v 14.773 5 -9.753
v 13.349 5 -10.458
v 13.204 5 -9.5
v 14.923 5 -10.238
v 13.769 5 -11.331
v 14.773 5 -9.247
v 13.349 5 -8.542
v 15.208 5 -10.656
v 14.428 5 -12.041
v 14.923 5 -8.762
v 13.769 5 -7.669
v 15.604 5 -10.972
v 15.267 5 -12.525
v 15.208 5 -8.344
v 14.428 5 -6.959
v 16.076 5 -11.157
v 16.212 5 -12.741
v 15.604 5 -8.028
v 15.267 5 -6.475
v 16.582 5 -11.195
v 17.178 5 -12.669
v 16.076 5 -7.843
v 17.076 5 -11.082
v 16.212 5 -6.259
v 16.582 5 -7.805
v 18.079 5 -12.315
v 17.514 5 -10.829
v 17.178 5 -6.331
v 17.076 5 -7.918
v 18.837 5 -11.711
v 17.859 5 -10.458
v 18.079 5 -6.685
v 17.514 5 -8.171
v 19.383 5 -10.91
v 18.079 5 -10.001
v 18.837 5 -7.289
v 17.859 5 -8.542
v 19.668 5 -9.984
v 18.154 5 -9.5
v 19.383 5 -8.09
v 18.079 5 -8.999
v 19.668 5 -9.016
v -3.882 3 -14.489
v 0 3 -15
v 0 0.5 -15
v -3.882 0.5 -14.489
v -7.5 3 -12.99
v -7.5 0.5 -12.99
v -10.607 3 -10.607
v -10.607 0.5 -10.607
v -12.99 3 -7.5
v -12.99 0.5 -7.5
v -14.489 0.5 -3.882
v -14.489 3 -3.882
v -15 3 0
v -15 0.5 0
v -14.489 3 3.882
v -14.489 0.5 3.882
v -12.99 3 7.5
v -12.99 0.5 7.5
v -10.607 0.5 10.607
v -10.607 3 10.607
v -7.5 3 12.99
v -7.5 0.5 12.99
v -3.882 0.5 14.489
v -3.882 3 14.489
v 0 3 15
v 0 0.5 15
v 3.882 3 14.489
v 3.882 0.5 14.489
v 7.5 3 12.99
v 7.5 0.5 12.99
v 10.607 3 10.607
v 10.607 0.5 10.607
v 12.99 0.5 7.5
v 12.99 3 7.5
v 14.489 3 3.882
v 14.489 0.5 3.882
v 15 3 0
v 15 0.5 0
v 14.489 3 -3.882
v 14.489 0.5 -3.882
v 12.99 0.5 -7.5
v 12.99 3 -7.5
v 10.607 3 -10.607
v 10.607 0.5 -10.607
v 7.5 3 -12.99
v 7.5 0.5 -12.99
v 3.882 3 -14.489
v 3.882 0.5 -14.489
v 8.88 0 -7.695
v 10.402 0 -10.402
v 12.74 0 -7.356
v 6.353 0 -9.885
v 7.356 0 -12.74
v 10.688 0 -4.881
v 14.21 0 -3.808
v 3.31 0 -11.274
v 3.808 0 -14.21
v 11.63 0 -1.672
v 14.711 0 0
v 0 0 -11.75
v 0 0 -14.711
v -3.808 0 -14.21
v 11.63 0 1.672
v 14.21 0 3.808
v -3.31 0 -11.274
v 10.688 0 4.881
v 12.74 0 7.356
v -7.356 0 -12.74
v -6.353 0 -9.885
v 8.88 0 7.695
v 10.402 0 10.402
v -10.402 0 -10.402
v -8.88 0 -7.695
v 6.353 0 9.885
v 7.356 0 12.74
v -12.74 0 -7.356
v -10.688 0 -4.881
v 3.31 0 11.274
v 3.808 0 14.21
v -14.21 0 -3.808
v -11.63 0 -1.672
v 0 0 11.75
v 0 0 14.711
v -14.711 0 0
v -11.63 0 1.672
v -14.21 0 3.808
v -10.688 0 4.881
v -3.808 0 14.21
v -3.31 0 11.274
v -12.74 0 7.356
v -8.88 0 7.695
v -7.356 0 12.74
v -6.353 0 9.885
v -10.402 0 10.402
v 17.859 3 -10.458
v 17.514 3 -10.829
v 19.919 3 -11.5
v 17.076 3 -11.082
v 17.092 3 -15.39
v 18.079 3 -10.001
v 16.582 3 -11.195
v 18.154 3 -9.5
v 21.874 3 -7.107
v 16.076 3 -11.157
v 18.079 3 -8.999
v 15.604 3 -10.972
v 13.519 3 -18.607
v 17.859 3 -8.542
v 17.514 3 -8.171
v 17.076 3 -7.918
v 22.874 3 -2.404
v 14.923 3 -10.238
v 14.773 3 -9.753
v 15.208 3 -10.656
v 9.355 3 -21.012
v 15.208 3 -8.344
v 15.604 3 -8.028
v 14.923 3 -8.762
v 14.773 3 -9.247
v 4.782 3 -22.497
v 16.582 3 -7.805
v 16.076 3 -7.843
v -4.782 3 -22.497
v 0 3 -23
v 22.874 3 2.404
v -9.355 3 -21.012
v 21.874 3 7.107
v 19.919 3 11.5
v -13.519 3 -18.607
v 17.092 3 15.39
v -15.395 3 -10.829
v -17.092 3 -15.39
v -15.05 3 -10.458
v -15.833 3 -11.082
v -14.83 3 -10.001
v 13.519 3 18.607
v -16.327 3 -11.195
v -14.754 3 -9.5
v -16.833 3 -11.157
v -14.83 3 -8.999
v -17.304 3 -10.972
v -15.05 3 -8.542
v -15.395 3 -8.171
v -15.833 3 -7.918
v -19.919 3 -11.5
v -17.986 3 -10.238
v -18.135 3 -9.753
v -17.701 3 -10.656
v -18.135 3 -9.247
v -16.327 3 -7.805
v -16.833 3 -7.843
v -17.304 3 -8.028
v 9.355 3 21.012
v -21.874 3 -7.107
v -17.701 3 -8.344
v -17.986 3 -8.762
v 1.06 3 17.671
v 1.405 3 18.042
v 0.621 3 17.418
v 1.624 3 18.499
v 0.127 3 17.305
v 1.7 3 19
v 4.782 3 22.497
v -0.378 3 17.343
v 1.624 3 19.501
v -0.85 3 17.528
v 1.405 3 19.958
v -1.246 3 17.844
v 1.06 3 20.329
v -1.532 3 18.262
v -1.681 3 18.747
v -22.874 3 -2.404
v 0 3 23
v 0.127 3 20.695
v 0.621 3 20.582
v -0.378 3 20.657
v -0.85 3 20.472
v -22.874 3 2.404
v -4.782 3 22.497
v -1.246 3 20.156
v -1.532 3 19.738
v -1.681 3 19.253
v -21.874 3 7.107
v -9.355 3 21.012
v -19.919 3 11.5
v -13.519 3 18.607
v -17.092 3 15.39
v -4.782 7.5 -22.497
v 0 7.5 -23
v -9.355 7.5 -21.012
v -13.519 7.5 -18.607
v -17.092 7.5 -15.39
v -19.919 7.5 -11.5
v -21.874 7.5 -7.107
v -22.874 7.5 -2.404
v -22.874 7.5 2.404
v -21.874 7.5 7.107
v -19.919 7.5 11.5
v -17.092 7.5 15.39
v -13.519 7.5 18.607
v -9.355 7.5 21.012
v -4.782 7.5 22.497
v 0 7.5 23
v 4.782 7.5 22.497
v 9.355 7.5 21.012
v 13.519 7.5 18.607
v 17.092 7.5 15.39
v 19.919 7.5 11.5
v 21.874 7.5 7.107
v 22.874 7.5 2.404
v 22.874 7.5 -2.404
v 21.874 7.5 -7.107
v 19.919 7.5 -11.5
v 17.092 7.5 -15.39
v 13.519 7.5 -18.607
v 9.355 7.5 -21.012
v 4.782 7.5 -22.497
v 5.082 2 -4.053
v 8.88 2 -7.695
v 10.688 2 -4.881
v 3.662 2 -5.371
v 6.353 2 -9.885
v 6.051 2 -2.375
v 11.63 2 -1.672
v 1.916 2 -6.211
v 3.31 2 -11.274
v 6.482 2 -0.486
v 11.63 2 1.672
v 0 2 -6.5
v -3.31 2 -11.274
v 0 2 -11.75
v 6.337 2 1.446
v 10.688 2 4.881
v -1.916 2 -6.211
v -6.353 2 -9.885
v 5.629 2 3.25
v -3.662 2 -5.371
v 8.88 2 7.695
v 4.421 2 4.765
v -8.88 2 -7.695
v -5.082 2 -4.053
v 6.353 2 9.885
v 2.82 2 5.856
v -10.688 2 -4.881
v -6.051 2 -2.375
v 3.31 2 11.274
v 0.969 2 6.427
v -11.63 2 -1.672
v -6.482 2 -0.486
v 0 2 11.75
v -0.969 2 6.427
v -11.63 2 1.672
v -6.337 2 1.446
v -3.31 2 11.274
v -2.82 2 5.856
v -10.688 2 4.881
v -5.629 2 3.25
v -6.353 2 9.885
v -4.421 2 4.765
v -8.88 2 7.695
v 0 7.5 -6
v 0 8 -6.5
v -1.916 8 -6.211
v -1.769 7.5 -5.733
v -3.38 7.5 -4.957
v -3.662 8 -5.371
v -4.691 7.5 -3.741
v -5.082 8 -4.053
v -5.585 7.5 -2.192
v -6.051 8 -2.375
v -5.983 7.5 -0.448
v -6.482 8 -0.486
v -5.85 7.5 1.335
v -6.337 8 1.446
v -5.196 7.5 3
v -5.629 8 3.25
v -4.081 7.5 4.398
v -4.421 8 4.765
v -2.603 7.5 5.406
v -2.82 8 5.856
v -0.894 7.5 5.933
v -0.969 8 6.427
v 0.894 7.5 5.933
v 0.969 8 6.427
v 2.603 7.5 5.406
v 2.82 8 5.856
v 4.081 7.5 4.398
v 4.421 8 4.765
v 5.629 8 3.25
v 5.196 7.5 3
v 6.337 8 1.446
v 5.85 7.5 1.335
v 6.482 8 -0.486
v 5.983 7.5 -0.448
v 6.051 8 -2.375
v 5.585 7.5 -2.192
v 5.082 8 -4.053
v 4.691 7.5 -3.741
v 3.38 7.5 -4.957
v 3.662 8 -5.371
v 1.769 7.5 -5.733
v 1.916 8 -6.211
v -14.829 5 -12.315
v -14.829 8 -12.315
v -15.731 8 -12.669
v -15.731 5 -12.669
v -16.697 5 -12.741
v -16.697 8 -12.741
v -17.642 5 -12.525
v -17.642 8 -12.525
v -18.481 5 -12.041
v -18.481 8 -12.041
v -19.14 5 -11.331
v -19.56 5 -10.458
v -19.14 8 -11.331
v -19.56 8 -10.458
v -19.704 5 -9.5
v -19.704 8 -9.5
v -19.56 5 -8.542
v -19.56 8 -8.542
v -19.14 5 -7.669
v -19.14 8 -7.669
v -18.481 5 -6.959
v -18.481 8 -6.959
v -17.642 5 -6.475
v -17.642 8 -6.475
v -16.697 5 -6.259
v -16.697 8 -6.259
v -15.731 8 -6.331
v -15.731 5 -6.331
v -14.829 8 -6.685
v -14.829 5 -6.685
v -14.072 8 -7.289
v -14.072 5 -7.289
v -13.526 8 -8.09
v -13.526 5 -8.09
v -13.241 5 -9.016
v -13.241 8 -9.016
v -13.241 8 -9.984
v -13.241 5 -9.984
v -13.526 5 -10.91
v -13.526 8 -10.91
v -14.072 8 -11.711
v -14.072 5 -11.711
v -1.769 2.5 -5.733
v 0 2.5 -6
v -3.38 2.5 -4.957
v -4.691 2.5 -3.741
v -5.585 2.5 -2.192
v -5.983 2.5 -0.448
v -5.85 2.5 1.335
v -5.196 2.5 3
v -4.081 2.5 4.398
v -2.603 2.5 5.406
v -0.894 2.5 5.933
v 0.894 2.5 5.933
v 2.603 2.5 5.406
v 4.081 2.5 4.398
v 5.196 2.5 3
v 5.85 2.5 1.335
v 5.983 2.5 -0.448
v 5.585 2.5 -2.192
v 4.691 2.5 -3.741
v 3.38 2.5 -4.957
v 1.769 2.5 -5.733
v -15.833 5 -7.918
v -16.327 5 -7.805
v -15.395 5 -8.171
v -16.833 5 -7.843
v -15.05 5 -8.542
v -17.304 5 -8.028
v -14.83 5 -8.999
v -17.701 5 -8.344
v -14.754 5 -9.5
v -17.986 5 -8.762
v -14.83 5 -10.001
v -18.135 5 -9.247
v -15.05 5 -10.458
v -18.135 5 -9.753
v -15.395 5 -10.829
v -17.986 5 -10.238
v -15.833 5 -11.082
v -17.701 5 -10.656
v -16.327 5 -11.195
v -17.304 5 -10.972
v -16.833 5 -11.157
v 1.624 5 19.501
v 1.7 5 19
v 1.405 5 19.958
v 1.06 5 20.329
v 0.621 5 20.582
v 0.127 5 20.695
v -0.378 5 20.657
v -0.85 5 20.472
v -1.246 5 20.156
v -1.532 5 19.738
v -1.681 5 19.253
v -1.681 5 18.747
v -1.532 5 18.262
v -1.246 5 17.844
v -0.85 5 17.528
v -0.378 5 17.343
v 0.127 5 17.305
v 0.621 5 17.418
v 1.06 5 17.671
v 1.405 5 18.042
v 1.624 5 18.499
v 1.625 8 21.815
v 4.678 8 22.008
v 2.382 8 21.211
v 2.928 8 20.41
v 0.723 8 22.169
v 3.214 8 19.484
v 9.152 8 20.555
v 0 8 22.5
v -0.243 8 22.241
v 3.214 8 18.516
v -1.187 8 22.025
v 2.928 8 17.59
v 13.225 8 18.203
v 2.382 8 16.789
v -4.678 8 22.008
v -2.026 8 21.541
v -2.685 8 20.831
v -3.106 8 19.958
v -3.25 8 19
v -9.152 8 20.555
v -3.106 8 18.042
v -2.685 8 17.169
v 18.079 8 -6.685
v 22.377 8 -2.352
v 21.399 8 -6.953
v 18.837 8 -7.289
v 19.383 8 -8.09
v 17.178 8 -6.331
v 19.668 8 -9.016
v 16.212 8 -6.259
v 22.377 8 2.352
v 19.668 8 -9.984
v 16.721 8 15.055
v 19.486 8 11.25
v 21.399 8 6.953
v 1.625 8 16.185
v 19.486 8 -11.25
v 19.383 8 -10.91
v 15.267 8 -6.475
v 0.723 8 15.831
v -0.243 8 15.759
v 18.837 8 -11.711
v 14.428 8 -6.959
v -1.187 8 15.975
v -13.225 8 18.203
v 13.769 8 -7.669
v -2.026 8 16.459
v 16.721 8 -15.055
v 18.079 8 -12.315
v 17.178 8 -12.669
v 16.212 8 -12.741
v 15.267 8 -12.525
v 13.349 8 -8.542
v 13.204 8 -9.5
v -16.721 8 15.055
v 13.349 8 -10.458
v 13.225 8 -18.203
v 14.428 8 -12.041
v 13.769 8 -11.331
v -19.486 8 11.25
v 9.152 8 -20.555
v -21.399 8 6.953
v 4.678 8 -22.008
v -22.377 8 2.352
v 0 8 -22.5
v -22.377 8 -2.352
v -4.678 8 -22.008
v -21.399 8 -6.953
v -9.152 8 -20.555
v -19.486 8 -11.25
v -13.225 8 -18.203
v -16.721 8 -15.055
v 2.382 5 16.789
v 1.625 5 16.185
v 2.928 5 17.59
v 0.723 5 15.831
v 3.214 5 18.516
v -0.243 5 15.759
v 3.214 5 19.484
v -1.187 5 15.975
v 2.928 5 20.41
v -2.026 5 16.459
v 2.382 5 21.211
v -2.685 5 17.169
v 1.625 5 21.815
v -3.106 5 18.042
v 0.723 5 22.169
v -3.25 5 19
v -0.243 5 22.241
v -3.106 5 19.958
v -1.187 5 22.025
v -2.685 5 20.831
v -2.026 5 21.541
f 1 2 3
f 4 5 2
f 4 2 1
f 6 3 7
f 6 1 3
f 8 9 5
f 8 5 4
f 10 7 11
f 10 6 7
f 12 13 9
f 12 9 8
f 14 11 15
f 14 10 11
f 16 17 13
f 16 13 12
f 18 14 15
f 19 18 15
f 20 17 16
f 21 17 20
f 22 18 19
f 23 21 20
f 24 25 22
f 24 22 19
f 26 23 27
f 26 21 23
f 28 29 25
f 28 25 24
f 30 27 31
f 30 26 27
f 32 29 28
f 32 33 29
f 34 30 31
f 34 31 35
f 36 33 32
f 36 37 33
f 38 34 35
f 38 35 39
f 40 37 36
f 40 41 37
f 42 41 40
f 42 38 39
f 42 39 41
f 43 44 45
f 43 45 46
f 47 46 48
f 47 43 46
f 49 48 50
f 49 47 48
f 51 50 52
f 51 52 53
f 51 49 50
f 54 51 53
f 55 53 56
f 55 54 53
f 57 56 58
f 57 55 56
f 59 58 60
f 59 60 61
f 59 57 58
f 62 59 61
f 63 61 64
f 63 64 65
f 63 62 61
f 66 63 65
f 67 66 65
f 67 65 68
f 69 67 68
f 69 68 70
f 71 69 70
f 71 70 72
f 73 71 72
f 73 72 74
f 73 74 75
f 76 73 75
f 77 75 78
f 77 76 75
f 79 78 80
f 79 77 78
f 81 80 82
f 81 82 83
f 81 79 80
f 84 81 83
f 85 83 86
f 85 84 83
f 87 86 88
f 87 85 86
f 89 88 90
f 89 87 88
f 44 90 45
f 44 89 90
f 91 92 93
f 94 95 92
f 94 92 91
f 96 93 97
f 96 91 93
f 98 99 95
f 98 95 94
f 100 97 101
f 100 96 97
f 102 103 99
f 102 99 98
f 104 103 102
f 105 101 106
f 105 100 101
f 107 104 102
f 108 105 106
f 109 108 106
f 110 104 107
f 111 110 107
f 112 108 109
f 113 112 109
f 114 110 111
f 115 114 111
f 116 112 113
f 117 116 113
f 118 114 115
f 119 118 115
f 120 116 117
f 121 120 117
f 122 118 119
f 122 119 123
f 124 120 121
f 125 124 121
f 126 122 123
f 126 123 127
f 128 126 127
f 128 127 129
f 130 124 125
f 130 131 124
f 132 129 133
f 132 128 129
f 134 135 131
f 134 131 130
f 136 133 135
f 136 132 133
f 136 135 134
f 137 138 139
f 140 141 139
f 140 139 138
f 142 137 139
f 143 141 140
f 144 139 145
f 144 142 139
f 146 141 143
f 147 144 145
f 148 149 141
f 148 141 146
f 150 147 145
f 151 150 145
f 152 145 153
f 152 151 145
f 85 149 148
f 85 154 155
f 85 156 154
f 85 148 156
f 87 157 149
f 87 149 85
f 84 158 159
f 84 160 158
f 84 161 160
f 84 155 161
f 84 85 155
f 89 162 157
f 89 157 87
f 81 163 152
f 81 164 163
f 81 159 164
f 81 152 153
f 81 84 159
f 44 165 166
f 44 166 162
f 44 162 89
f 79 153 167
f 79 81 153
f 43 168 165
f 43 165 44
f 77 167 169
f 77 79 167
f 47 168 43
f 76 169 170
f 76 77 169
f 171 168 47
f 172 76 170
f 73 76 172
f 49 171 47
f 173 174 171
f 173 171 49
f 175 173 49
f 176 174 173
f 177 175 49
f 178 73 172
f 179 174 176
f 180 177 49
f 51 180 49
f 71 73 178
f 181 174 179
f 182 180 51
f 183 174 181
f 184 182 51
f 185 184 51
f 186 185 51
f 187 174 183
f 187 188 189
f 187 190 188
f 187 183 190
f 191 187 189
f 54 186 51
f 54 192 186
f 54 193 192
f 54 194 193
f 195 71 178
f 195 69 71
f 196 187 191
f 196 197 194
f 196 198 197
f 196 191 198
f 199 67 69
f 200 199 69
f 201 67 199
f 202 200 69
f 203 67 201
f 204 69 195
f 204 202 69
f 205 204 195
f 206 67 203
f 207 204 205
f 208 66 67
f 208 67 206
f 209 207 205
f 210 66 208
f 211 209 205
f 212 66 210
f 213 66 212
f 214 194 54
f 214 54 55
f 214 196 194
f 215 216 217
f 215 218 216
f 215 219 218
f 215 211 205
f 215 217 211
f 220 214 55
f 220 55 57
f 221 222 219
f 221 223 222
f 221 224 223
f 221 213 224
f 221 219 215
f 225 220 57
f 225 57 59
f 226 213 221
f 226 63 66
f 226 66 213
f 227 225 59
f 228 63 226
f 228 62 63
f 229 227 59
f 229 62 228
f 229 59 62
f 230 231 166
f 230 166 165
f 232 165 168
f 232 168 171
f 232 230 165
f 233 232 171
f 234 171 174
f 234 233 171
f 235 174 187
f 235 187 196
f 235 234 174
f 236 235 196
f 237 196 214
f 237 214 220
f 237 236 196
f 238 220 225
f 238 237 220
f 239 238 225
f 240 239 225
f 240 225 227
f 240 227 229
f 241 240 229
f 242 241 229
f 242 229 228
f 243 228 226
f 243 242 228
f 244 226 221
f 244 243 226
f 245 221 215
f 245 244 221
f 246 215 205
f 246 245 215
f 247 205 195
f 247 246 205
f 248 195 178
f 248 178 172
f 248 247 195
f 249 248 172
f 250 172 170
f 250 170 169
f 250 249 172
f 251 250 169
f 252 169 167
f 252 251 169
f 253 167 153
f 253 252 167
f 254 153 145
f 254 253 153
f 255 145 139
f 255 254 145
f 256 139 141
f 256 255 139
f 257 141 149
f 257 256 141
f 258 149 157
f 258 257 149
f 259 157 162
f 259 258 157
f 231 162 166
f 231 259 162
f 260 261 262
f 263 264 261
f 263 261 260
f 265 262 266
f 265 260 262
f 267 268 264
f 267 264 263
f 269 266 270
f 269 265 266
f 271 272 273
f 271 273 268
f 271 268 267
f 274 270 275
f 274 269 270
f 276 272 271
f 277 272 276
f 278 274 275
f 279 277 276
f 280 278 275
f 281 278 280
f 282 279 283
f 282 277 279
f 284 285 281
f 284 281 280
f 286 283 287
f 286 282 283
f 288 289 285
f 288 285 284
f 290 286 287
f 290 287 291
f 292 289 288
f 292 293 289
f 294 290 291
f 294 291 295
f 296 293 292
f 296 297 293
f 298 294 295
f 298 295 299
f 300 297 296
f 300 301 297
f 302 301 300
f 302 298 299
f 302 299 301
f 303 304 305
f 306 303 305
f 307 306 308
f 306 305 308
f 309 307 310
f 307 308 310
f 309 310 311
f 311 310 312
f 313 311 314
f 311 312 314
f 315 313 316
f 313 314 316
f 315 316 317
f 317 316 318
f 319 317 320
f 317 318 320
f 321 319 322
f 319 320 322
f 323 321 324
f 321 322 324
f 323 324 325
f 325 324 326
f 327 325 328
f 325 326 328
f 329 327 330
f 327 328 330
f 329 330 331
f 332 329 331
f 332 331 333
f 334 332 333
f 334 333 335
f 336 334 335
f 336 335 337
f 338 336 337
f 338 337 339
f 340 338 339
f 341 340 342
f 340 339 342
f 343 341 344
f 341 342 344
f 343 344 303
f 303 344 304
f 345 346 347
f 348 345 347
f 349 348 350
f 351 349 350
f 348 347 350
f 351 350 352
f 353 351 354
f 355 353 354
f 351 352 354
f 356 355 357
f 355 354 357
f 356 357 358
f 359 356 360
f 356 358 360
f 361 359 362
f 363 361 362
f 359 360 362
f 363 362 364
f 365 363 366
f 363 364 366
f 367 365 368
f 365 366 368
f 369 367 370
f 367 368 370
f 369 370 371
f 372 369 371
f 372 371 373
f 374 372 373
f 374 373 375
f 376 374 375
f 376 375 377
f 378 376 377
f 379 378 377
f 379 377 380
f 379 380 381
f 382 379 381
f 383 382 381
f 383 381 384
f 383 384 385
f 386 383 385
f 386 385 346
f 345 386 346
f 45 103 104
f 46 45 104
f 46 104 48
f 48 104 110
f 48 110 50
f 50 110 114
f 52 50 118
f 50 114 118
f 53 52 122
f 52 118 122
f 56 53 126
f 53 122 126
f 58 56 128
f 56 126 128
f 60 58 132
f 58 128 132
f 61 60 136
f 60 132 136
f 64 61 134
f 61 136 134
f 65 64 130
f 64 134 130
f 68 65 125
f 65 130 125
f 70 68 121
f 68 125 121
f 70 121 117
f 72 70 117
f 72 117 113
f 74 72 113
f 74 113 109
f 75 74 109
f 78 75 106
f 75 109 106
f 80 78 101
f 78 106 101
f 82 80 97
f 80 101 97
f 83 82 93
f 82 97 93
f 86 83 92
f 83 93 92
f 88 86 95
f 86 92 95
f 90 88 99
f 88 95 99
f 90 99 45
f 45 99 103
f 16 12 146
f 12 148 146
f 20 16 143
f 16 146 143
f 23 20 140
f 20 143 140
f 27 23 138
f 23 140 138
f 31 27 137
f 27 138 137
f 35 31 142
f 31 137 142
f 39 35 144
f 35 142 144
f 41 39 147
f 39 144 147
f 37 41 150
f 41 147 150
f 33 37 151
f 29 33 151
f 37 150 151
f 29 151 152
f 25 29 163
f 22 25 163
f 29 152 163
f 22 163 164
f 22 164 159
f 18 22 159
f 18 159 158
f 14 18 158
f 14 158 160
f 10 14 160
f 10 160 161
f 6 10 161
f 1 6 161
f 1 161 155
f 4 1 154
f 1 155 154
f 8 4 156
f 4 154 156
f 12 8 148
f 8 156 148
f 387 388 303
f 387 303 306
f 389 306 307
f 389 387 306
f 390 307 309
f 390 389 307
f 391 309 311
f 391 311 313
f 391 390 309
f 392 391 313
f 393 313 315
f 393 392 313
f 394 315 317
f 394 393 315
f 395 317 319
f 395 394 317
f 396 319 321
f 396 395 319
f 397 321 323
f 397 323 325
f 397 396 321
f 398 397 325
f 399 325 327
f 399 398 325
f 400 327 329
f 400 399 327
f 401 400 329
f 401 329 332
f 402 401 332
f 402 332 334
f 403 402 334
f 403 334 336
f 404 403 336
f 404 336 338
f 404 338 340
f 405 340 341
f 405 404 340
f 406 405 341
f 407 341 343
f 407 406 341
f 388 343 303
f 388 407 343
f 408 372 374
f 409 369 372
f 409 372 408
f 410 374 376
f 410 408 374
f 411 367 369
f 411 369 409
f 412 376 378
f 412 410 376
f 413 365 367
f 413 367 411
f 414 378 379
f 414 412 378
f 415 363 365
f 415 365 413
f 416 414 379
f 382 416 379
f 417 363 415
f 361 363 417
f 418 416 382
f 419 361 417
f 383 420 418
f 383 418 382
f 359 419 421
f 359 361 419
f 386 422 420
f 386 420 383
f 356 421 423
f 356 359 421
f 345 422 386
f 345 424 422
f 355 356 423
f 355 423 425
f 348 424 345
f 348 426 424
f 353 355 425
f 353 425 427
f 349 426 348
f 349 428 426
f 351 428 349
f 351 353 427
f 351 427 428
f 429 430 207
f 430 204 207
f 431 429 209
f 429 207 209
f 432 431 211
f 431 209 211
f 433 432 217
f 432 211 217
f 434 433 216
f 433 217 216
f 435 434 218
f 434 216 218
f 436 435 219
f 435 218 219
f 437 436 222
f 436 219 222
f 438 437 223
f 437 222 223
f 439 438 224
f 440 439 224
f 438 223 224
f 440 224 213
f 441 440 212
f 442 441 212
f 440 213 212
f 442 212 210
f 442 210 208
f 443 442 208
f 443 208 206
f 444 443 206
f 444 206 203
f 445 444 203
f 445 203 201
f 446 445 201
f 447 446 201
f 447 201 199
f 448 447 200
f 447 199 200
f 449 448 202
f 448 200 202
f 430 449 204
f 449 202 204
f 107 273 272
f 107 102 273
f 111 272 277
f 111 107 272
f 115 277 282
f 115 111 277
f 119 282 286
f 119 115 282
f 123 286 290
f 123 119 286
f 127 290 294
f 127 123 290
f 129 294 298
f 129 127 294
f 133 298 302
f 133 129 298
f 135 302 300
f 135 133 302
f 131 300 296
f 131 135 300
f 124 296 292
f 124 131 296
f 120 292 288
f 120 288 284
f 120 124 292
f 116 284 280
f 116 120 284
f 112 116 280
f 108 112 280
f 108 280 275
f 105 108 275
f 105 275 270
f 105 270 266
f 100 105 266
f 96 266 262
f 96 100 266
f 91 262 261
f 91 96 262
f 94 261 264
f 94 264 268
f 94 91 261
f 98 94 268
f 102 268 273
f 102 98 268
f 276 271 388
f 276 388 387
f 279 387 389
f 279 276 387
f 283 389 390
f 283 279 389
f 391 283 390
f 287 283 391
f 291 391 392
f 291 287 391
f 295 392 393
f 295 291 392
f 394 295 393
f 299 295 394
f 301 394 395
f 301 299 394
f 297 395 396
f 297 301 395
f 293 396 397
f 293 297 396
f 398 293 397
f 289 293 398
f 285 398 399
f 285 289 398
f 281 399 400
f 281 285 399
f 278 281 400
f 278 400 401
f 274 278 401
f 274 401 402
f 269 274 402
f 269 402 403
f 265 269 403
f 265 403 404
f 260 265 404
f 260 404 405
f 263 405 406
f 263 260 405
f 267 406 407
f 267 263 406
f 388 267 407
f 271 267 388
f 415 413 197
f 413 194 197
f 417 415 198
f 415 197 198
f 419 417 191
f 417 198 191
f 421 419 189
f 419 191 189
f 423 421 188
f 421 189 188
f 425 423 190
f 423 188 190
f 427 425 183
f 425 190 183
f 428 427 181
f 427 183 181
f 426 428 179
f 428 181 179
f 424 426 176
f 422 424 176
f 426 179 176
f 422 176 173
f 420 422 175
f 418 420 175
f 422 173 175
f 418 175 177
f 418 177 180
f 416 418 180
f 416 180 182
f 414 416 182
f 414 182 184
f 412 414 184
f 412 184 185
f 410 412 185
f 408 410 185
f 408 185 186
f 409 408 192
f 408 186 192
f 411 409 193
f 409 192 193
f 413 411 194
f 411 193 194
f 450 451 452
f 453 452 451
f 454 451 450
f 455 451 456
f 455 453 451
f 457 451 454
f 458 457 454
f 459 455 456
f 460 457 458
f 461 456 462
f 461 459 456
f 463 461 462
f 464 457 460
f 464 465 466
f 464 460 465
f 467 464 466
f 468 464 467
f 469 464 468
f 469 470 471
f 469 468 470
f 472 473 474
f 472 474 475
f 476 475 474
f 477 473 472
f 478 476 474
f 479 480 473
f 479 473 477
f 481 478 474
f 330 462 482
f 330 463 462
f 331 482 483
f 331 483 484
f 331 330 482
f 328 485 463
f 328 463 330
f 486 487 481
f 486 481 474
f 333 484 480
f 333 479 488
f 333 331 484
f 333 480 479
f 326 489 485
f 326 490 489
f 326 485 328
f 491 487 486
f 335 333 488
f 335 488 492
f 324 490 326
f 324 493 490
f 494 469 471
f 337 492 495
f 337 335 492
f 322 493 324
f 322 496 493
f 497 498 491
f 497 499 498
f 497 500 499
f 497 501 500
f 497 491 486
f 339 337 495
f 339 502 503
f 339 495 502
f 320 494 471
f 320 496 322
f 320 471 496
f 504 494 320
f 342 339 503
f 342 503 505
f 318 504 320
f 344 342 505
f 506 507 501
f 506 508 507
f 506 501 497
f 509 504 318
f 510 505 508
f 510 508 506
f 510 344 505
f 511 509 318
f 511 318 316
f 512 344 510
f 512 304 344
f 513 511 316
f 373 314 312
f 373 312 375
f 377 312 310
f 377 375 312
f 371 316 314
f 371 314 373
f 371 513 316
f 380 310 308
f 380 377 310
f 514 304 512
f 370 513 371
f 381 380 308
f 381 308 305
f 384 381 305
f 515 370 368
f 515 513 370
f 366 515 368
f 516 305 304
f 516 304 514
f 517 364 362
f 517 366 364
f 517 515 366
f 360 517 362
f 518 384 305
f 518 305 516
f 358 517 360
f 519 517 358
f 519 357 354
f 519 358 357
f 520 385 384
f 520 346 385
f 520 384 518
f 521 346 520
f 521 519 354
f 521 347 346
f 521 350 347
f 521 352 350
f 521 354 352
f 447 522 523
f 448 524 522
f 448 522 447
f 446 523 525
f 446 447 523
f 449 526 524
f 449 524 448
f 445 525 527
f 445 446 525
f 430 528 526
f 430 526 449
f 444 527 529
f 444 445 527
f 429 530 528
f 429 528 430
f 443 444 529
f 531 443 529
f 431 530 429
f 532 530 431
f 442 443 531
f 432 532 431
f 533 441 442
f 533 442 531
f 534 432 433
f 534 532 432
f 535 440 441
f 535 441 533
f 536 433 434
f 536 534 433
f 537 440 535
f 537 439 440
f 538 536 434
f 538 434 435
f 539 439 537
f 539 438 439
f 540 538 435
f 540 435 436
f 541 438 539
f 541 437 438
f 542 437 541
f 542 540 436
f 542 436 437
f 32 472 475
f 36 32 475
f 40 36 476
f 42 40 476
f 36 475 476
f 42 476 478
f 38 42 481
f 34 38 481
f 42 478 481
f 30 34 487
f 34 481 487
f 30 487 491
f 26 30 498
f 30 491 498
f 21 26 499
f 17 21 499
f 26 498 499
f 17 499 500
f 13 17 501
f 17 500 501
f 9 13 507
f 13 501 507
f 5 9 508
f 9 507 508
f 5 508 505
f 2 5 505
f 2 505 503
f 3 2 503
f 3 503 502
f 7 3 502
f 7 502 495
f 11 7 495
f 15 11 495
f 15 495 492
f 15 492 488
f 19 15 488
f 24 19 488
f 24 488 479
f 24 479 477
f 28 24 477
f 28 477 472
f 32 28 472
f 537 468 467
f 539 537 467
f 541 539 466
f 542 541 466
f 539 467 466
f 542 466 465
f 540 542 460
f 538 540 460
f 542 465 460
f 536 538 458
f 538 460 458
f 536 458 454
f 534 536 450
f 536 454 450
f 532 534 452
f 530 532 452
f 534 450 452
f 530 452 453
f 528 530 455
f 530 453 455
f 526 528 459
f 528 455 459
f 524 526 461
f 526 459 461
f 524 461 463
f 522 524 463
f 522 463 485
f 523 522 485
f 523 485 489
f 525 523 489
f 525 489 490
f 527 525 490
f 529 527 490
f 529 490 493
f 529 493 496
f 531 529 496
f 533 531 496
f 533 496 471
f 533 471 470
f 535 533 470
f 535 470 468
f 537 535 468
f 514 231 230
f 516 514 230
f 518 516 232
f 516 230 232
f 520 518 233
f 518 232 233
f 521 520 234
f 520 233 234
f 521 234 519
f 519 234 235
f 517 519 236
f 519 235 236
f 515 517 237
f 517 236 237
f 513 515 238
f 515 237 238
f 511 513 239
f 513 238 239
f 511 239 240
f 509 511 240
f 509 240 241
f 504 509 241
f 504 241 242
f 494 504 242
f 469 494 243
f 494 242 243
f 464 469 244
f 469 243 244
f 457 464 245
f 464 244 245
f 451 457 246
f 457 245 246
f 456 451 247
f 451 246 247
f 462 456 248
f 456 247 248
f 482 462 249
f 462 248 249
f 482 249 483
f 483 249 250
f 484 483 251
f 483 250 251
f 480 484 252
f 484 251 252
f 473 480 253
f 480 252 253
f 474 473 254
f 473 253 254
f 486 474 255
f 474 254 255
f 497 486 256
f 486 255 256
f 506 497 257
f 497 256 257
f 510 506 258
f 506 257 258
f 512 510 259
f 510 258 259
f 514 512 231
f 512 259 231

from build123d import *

# Parameters (mm, degrees)
CHANFREIN2_SIZE                                    = 0.5
CHANFREIN2_SIZE2                                   = 0.288675135
CHANFREIN3_SIZE                                    = 0.5
CHANFREIN4_SIZE                                    = 0.5
CHANFREIN5_SIZE                                    = 0.5
CHAMBRAGE_POUR_VIS_T_TE_HEXAGONALE_M31_D           = 3.4
CHAMBRAGE_POUR_VIS_T_TE_HEXAGONALE_M31_CBORE_D     = 6.5
CHAMBRAGE_POUR_VIS_T_TE_HEXAGONALE_M31_CBORE_DEPTH = 3
R_P_TITION_CIRCULAIRE1_COUNT                       = 3


with BuildPart() as part:
    # Esquisse1 → Révolution1 (revolve)
    with BuildSketch(Plane.XY, mode=Mode.PRIVATE) as r_volution1_sk:
        Polygon((11.75, 0), (15, 0), (15, 3), (23, 3), (23, 8), (6, 8), (6, 2), (11.75, 2), align=None)
    revolve(r_volution1_sk.sketch.rotate(Axis((0, 0, 0), (0, 1, 0)), 90), axis=Axis((0, 0, 0), (0, 1, 0)))  # turned: the seam where the file's is

    # Chanfrein2
    chanfrein2_edges = [part.edges().sort_by_distance(p)[0] for p in [
        (0, 0, 15),
    ]]
    chanfrein2_side = [part.faces().sort_by_distance(p)[0] for p in [
        (0, 1.5, 15),
    ]]
    chamfer(chanfrein2_edges, length=CHANFREIN2_SIZE, length2=CHANFREIN2_SIZE2, reference=chanfrein2_side[0])

    # Chanfrein3
    chanfrein3_edges = [part.edges().sort_by_distance(p)[0] for p in [
        (0, 8, 6),
    ]]
    chamfer(chanfrein3_edges, length=CHANFREIN3_SIZE)

    # Chanfrein4
    chanfrein4_edges = [part.edges().sort_by_distance(p)[0] for p in [
        (0, 2, 6),
    ]]
    chamfer(chanfrein4_edges, length=CHANFREIN4_SIZE)

    # Chanfrein5
    chanfrein5_edges = [part.edges().sort_by_distance(p)[0] for p in [
        (0, 8, 23),
    ]]
    chamfer(chanfrein5_edges, length=CHANFREIN5_SIZE)

    # Chambrage pour vis à tête hexagonale M31 (through all)
    with Locations(Plane(origin=(0, 8, 0), x_dir=(-1, 0, 0), z_dir=(0, 1, 0))):
        with Locations((0, 19)):
            chambrage_pour_vis_t_te_hexagonale_m31 = CounterBoreHole(CHAMBRAGE_POUR_VIS_T_TE_HEXAGONALE_M31_D / 2, CHAMBRAGE_POUR_VIS_T_TE_HEXAGONALE_M31_CBORE_D / 2, CHAMBRAGE_POUR_VIS_T_TE_HEXAGONALE_M31_CBORE_DEPTH)

    # Répétition circulaire1: Chambrage pour vis à tête hexagonale M31 ×3 about axis
    r_p_tition_circulaire1_axis = Axis((0, 0, 0), (0, 1, 0))
    for i in range(1, R_P_TITION_CIRCULAIRE1_COUNT):
        add(chambrage_pour_vis_t_te_hexagonale_m31.rotate(r_p_tition_circulaire1_axis, i * 360 / R_P_TITION_CIRCULAIRE1_COUNT), mode=Mode.SUBTRACT)


solid = part.part
